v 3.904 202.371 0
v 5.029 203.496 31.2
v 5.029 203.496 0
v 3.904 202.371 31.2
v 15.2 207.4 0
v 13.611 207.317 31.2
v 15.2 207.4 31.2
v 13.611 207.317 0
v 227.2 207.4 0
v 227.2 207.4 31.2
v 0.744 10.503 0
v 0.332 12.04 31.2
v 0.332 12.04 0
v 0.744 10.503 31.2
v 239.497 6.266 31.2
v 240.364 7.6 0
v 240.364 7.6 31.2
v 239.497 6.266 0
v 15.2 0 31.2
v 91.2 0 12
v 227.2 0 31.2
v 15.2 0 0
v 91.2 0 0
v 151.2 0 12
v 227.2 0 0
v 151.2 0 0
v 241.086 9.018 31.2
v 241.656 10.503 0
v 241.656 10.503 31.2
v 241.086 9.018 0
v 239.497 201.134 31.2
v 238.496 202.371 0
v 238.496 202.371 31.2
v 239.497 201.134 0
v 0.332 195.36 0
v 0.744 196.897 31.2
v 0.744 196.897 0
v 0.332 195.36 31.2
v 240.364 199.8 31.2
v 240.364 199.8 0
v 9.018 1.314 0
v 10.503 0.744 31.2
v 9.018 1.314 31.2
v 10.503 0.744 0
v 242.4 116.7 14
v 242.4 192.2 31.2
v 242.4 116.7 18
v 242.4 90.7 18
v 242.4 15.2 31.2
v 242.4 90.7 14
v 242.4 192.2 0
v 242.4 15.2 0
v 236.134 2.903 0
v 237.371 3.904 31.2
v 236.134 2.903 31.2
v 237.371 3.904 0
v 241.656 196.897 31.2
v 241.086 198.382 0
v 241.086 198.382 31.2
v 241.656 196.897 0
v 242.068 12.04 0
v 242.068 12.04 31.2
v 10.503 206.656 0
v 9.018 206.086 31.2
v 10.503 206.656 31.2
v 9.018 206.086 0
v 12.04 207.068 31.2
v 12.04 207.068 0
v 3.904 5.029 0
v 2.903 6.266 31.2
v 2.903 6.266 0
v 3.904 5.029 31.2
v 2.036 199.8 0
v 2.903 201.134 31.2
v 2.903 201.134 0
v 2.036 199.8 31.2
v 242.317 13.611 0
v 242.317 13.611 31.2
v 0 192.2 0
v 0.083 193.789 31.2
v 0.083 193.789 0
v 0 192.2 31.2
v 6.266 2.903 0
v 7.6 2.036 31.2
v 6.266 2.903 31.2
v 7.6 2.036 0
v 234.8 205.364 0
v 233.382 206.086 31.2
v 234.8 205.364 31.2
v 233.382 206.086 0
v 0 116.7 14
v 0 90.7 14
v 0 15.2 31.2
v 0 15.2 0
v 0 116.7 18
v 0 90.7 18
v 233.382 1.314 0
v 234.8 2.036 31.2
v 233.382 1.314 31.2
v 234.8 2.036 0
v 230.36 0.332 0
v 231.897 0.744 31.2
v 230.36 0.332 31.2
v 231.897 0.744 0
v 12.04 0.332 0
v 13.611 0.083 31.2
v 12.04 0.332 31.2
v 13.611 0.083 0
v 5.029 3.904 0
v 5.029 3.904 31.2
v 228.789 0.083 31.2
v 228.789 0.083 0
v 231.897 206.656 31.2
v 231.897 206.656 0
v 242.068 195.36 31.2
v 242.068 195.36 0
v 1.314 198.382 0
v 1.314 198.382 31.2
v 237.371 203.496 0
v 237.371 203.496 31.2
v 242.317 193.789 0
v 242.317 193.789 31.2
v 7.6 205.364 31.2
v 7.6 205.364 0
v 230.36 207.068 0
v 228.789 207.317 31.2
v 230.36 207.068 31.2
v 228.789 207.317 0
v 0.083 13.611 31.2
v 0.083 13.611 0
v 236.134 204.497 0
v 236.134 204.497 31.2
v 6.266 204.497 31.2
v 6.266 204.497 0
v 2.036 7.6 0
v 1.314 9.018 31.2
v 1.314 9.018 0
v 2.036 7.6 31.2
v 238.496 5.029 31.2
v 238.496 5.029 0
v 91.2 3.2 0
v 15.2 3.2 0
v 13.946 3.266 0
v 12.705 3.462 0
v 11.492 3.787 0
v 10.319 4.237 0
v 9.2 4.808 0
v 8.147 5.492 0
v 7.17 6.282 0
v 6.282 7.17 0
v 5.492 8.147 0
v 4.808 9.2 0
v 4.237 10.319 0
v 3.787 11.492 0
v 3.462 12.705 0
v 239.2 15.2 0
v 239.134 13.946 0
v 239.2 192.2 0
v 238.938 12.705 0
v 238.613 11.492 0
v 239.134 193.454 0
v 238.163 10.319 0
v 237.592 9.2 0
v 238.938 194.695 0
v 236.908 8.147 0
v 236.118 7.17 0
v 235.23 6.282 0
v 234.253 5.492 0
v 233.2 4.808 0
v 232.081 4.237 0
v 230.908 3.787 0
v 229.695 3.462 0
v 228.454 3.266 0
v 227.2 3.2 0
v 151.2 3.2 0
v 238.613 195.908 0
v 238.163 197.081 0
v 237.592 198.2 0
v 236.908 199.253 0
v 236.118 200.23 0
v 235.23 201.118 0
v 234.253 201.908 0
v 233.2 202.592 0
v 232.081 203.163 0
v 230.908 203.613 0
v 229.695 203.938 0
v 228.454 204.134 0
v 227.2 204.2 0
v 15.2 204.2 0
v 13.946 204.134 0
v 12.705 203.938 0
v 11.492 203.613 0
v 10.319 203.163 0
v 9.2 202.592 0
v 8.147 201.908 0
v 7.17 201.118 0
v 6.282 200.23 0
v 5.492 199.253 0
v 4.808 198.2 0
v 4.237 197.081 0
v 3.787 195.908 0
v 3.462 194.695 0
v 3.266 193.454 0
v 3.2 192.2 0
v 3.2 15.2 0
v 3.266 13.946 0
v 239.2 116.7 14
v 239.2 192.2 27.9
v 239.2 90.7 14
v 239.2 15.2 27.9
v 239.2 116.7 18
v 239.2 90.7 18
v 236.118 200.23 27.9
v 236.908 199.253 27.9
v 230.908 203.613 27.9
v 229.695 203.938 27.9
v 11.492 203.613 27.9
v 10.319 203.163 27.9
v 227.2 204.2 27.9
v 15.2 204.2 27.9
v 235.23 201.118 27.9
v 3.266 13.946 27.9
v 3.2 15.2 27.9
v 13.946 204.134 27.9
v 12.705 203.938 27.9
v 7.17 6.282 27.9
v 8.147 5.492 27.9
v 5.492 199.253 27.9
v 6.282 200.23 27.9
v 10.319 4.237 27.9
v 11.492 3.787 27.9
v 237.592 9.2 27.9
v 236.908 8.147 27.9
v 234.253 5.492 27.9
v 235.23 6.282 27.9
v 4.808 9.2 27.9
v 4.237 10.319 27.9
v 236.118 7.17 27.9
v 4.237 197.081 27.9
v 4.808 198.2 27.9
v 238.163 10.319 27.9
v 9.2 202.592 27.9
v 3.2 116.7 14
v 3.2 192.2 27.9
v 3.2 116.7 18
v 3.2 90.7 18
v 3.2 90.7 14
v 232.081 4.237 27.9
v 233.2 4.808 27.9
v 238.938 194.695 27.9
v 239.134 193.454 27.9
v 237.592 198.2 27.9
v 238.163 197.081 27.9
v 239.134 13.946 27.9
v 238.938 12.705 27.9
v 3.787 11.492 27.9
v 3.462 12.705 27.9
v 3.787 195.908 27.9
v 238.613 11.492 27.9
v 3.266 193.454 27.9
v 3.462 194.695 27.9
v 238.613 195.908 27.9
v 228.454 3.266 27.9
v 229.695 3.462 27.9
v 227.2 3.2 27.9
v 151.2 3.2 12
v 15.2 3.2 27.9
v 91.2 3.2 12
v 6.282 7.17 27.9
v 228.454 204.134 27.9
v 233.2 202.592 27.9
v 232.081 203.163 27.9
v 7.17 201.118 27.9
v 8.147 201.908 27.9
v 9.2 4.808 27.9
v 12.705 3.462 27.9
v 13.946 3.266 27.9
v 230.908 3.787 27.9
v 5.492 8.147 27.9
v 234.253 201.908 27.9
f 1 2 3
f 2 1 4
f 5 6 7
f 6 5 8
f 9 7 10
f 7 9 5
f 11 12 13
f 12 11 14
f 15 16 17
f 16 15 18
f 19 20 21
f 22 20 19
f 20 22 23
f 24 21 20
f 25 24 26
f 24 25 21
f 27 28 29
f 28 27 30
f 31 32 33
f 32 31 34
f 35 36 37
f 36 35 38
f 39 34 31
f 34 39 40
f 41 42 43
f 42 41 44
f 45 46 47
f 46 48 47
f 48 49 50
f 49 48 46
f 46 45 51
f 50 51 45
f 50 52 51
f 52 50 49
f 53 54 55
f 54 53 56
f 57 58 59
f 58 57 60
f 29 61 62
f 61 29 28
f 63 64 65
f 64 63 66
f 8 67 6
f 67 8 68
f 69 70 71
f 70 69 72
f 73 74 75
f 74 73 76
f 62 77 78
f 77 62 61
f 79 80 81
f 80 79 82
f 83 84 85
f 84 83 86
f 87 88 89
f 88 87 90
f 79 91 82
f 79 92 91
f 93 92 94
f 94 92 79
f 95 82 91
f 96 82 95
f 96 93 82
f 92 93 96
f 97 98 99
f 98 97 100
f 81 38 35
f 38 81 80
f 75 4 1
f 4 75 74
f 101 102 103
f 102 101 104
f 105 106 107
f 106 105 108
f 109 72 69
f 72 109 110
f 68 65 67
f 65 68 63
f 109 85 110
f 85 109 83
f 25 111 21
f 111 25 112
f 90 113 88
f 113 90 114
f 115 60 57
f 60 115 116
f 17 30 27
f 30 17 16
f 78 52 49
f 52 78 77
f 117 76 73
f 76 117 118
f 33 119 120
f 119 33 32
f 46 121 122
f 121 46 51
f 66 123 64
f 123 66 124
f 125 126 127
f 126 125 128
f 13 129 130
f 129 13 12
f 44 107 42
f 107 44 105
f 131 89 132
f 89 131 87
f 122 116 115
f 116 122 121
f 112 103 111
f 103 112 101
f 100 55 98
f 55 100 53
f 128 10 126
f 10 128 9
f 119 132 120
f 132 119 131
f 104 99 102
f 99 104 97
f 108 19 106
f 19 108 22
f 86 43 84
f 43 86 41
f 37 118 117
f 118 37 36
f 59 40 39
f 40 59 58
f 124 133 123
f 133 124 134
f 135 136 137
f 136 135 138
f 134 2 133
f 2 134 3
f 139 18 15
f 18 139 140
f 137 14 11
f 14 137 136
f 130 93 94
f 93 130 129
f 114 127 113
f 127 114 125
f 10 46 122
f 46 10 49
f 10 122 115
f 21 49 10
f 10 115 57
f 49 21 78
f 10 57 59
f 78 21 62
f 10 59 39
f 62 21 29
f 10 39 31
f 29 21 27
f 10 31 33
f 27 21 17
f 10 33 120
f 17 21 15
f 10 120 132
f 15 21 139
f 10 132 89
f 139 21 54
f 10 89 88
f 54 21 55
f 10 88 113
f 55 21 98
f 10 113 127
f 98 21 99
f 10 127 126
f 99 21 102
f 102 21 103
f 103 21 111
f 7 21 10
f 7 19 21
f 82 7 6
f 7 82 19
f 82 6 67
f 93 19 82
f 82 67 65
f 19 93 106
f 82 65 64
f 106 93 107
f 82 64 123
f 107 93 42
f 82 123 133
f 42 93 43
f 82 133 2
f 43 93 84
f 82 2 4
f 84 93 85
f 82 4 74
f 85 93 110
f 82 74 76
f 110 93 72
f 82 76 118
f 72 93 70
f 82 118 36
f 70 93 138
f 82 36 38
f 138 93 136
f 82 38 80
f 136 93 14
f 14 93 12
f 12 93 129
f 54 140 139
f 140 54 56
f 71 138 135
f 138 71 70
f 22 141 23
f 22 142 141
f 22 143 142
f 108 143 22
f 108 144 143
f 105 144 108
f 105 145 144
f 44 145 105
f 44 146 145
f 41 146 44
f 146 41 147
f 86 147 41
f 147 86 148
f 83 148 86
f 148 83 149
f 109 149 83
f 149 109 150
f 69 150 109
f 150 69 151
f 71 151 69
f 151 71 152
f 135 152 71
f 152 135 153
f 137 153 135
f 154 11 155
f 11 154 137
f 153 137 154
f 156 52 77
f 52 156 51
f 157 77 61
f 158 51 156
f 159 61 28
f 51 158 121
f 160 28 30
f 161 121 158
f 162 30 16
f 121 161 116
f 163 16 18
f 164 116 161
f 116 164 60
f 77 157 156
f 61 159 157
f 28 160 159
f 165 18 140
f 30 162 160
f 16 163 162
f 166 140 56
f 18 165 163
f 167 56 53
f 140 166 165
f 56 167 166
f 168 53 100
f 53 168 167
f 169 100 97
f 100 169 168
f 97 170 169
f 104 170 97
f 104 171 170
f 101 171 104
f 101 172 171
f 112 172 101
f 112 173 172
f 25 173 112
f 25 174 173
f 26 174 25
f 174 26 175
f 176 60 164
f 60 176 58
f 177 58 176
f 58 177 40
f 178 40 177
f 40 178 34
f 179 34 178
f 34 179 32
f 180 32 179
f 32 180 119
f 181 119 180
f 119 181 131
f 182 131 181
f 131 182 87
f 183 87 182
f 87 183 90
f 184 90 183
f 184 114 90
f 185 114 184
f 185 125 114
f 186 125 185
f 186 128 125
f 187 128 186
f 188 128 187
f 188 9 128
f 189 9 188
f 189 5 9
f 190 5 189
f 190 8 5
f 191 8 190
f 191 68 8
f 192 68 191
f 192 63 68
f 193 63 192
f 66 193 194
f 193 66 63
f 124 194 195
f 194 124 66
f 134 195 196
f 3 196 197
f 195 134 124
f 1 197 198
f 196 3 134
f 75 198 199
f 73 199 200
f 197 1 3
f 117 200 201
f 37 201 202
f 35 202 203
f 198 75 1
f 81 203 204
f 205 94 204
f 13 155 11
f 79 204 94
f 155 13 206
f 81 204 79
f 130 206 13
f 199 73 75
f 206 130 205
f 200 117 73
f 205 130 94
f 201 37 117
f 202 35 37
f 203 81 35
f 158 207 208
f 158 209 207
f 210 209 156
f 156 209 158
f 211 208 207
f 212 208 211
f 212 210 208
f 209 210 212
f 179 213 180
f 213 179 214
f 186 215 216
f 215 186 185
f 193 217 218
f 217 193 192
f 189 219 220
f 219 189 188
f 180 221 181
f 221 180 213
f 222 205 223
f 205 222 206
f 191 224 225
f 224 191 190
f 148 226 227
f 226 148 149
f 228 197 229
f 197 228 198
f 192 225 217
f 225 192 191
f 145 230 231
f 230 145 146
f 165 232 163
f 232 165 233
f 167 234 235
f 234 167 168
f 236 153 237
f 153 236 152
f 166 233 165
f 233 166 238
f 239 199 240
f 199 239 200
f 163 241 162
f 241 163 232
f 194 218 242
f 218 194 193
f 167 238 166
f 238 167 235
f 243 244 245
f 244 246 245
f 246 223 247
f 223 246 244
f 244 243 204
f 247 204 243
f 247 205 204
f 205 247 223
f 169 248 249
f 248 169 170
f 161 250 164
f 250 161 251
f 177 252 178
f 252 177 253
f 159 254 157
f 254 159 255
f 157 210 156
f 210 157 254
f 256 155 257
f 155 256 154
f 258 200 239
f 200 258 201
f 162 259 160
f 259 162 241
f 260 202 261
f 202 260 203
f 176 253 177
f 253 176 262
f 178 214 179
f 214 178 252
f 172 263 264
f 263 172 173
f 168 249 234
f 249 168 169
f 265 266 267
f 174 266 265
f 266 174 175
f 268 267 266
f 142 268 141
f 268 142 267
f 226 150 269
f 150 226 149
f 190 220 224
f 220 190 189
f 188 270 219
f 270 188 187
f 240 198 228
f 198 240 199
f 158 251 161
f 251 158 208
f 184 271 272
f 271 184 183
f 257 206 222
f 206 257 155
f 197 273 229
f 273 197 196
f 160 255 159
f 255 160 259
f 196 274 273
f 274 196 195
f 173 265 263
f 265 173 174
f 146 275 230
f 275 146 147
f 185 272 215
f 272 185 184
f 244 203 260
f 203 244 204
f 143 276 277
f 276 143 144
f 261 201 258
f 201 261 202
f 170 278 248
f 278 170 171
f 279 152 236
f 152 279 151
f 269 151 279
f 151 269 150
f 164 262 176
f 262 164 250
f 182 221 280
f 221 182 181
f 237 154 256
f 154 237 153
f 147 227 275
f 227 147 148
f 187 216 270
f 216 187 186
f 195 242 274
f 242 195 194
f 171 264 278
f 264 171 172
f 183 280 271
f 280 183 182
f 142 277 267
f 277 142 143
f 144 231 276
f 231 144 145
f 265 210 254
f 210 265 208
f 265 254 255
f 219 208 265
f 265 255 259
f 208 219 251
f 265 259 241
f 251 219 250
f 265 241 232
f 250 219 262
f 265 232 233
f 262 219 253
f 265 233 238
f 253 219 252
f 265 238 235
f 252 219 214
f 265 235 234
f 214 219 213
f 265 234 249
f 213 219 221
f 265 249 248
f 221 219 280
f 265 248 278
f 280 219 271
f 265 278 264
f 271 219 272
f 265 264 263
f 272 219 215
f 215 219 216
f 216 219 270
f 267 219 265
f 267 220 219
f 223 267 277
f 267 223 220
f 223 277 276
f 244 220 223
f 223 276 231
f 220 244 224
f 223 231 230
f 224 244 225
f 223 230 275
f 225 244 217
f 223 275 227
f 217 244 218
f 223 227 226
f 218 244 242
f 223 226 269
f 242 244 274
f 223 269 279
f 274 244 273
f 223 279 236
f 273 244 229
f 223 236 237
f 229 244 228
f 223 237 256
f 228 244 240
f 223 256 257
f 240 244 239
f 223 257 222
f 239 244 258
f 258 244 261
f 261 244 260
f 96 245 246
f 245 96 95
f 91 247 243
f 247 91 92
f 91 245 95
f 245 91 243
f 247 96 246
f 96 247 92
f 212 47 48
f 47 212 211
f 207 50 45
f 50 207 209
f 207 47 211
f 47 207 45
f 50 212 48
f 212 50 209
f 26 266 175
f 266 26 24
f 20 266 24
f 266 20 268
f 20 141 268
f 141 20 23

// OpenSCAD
// Hercules DJ Console (MK1 - 2003) Replacement Faceplate Deck-Saver & Carrier Frame
// Parametric OpenSCAD Model to replace the lost polycarbonate clamshell and strap loops.
//
// Console Physical Dimensions:
// Width: 235mm, Depth: 200mm, Base Height: 45mm, Knobs/Jog Protrusion: 20mm (Total 65mm)

$fn = 60;

console_w = 236.0;   // 1mm clearance
console_d = 201.0;   // 1mm clearance
cover_h   = 28.0;    // Clear jog wheels and EQ pots
wall_t    = 3.2;     // Robust printable shell thickness
corner_r  = 12.0;    // Corner radius of console aluminum bevel
strap_w   = 26.0;    // 25mm nylon webbing slot
strap_t   = 4.0;

module rounded_box(w, d, h, r) {
    hull() {
        translate([r, r, 0]) cylinder(r=r, h=h);
        translate([w - r, r, 0]) cylinder(r=r, h=h);
        translate([r, d - r, 0]) cylinder(r=r, h=h);
        translate([w - r, d - r, 0]) cylinder(r=r, h=h);
    }
}

module hercules_mk1_deck_saver() {
    difference() {
        // Outer protective perimeter
        rounded_box(console_w + 2*wall_t, console_d + 2*wall_t, cover_h + wall_t, corner_r + wall_t);

        // Inner cavity protecting jog wheels & knobs
        translate([wall_t, wall_t, -0.1])
            rounded_box(console_w, console_d, cover_h, corner_r);

        // Side carry strap loop slots (Left and Right)
        translate([-1, (console_d + 2*wall_t - strap_w)/2, cover_h/2])
            cube([wall_t + 2, strap_w, strap_t]);

        translate([console_w + wall_t - 1, (console_d + 2*wall_t - strap_w)/2, cover_h/2])
            cube([wall_t + 2, strap_w, strap_t]);

        // Front headphone jack clearance notch
        translate([(console_w + 2*wall_t - 60)/2, -1, 0])
            cube([60, wall_t + 2, 12]);
    }
}

hercules_mk1_deck_saver();
